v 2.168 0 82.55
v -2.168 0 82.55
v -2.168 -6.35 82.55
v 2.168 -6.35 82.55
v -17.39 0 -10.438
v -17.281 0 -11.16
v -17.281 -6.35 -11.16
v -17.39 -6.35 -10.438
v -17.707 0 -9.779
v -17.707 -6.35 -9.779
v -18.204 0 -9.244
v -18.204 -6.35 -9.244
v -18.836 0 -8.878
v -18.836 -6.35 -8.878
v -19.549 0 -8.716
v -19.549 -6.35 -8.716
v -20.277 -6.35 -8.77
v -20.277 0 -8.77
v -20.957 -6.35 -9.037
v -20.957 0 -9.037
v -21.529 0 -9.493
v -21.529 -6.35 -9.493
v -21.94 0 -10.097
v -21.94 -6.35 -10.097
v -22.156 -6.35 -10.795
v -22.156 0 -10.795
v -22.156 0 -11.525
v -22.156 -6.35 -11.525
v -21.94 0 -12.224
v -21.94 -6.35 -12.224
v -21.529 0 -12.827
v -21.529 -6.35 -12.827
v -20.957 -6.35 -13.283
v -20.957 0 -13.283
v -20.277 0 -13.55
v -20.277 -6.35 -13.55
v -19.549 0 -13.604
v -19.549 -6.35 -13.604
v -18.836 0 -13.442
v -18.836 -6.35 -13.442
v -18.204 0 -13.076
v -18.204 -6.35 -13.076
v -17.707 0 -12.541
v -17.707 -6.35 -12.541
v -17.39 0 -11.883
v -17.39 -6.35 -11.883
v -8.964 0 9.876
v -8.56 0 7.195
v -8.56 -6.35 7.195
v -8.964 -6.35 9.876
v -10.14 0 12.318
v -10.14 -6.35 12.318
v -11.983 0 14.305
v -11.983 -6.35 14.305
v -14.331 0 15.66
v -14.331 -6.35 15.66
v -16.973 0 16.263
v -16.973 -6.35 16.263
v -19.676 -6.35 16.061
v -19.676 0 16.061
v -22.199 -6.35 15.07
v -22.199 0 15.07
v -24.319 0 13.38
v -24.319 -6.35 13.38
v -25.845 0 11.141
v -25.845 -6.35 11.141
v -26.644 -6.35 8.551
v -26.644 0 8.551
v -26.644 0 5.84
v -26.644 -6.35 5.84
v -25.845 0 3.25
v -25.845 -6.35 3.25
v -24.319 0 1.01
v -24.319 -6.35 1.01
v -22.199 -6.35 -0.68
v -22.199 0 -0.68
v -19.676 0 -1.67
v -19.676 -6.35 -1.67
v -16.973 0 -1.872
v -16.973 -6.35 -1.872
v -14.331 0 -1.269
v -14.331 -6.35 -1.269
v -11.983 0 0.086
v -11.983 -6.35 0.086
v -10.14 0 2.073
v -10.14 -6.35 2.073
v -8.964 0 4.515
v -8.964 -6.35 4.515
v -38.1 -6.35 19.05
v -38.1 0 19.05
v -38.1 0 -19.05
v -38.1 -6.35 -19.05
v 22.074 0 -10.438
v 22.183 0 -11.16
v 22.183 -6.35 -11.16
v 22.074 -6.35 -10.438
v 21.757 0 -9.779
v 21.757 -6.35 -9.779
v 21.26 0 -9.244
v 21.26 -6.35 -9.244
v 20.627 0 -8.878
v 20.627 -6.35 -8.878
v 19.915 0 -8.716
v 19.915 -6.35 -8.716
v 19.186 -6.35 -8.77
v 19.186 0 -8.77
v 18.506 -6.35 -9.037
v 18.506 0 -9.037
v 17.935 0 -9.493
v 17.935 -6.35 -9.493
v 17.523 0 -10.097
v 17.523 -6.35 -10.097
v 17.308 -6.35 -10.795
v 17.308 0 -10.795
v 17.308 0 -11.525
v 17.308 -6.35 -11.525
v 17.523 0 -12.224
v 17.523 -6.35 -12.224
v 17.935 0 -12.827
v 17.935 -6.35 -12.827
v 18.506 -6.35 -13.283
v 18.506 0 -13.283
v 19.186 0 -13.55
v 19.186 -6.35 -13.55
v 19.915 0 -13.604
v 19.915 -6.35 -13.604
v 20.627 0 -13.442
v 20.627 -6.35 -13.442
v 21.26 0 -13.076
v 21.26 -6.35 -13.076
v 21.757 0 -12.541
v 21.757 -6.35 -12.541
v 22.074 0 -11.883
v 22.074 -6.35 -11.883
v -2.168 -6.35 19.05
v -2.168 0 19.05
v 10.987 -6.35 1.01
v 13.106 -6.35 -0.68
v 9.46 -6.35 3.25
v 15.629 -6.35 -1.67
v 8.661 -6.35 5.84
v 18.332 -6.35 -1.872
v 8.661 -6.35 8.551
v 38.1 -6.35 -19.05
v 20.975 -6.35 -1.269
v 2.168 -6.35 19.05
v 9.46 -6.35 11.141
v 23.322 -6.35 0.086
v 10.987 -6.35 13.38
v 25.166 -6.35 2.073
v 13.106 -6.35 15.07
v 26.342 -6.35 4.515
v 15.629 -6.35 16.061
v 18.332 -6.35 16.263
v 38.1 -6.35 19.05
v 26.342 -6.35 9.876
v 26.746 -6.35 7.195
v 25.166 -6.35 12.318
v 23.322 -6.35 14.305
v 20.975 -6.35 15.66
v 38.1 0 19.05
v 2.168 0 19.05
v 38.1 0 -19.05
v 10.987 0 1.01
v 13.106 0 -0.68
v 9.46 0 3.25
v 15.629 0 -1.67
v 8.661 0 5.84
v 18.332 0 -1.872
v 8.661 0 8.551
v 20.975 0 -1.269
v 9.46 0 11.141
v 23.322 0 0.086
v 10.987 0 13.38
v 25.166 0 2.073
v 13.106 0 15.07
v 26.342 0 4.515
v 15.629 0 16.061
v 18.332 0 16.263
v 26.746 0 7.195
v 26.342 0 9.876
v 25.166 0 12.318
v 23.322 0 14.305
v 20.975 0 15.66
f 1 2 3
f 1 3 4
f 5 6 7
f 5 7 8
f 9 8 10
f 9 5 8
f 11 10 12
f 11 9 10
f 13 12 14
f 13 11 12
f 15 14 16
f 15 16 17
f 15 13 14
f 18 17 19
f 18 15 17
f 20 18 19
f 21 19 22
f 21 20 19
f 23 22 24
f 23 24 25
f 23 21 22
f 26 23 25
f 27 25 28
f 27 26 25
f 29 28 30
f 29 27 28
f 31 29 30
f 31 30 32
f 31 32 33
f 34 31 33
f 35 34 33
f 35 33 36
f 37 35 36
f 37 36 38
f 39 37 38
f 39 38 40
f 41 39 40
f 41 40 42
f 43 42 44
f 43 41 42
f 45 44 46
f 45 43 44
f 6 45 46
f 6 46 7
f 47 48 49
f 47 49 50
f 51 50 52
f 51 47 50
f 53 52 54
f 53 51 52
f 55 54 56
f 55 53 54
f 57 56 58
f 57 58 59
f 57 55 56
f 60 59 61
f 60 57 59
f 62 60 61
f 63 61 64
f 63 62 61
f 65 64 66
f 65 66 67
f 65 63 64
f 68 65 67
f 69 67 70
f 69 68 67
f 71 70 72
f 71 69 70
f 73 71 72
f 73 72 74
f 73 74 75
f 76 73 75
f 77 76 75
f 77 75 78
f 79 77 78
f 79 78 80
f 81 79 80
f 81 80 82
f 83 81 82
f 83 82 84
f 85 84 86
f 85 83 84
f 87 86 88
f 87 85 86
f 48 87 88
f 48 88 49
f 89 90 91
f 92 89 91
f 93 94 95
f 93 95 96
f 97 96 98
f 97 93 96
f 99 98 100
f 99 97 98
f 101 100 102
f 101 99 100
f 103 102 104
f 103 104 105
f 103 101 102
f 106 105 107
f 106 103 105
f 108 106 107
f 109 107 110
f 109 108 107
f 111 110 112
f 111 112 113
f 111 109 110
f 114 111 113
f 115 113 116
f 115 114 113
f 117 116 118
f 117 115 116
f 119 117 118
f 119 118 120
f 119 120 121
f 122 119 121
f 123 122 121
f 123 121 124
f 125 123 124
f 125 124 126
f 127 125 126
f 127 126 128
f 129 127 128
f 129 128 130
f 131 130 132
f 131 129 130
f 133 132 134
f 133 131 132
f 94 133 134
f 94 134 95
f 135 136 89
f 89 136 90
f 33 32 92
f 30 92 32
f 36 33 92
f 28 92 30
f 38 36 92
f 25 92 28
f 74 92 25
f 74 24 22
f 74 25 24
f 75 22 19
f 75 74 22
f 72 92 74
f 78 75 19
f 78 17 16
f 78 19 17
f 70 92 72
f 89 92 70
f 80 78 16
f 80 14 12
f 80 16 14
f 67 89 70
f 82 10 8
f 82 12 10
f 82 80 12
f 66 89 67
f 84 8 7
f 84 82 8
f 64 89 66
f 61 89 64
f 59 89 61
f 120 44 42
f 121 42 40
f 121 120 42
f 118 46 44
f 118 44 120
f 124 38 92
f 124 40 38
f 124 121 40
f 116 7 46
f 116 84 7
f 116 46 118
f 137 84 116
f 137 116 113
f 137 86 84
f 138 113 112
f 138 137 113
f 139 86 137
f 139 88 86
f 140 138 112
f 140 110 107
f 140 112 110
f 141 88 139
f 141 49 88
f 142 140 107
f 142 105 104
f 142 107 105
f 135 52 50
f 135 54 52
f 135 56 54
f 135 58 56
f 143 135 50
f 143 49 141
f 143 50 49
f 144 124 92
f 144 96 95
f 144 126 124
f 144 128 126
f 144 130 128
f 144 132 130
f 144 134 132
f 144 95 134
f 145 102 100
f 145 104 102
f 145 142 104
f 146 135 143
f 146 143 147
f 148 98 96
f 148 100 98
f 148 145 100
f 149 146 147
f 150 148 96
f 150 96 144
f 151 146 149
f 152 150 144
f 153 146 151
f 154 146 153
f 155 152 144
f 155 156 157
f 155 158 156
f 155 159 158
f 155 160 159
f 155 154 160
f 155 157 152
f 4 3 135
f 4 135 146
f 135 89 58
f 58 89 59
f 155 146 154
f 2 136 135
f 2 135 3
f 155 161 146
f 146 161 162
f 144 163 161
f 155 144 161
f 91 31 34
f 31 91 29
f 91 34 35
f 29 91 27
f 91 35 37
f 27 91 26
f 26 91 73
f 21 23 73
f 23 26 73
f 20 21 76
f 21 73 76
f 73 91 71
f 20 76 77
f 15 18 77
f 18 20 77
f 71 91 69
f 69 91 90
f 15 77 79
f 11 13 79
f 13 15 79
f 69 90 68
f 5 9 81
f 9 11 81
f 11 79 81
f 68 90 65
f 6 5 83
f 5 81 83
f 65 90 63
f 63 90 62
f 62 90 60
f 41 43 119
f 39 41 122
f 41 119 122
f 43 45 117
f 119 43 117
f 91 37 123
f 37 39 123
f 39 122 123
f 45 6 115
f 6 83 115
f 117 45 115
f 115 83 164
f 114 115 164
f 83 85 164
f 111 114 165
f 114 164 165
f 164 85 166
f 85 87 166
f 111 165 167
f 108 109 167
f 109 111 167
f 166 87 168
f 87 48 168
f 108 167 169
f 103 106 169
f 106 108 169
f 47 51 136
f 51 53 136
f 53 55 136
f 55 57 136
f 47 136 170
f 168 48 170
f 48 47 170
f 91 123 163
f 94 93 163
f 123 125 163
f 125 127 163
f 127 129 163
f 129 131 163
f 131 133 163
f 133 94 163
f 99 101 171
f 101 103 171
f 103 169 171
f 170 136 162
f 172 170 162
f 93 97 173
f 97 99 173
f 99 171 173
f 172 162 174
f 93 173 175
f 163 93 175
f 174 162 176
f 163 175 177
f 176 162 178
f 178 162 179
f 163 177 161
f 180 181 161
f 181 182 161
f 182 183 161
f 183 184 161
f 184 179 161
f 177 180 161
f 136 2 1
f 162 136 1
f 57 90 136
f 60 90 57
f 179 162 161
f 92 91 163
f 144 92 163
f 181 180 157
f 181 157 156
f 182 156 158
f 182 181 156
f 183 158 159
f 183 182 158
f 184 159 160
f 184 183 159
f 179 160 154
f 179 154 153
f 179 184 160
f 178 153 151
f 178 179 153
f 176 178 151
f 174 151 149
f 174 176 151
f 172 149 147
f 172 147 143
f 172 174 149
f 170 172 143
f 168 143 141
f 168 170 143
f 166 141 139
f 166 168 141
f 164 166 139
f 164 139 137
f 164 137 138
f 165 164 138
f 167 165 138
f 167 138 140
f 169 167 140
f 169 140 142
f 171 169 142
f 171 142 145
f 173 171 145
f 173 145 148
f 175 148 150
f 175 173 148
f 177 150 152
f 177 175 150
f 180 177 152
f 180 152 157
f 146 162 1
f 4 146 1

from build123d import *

# Parameters (mm, degrees)
F0_W     = 4.335432
F0_H     = 63.5
F0_R     = 2.4511
F0_R_2   = 9.0932
F1_DEPTH = 6.35


with BuildPart() as f1:
    # F0 (on Front) → F1 (new body)
    with BuildSketch(Plane.XZ):
        with Locations((0, 50.8)):
            Rectangle(F0_W, F0_H)
        Polygon((-38.1, -19.05), (38.1, -19.05), (38.1, 19.05), (2.167716, 19.05), (-2.167716, 19.05), (-38.1, 19.05), align=None)
        with Locations((-19.731838, -11.16004)):
            Circle(F0_R, mode=Mode.SUBTRACT)
        with Locations((-17.65278, 7.1953)):
            Circle(F0_R_2, mode=Mode.SUBTRACT)
        with Locations((19.731838, -11.16004)):
            Circle(F0_R, mode=Mode.SUBTRACT)
        with Locations((17.65278, 7.1953)):
            Circle(F0_R_2, mode=Mode.SUBTRACT)
    extrude(amount=F1_DEPTH)


solid = f1.part
